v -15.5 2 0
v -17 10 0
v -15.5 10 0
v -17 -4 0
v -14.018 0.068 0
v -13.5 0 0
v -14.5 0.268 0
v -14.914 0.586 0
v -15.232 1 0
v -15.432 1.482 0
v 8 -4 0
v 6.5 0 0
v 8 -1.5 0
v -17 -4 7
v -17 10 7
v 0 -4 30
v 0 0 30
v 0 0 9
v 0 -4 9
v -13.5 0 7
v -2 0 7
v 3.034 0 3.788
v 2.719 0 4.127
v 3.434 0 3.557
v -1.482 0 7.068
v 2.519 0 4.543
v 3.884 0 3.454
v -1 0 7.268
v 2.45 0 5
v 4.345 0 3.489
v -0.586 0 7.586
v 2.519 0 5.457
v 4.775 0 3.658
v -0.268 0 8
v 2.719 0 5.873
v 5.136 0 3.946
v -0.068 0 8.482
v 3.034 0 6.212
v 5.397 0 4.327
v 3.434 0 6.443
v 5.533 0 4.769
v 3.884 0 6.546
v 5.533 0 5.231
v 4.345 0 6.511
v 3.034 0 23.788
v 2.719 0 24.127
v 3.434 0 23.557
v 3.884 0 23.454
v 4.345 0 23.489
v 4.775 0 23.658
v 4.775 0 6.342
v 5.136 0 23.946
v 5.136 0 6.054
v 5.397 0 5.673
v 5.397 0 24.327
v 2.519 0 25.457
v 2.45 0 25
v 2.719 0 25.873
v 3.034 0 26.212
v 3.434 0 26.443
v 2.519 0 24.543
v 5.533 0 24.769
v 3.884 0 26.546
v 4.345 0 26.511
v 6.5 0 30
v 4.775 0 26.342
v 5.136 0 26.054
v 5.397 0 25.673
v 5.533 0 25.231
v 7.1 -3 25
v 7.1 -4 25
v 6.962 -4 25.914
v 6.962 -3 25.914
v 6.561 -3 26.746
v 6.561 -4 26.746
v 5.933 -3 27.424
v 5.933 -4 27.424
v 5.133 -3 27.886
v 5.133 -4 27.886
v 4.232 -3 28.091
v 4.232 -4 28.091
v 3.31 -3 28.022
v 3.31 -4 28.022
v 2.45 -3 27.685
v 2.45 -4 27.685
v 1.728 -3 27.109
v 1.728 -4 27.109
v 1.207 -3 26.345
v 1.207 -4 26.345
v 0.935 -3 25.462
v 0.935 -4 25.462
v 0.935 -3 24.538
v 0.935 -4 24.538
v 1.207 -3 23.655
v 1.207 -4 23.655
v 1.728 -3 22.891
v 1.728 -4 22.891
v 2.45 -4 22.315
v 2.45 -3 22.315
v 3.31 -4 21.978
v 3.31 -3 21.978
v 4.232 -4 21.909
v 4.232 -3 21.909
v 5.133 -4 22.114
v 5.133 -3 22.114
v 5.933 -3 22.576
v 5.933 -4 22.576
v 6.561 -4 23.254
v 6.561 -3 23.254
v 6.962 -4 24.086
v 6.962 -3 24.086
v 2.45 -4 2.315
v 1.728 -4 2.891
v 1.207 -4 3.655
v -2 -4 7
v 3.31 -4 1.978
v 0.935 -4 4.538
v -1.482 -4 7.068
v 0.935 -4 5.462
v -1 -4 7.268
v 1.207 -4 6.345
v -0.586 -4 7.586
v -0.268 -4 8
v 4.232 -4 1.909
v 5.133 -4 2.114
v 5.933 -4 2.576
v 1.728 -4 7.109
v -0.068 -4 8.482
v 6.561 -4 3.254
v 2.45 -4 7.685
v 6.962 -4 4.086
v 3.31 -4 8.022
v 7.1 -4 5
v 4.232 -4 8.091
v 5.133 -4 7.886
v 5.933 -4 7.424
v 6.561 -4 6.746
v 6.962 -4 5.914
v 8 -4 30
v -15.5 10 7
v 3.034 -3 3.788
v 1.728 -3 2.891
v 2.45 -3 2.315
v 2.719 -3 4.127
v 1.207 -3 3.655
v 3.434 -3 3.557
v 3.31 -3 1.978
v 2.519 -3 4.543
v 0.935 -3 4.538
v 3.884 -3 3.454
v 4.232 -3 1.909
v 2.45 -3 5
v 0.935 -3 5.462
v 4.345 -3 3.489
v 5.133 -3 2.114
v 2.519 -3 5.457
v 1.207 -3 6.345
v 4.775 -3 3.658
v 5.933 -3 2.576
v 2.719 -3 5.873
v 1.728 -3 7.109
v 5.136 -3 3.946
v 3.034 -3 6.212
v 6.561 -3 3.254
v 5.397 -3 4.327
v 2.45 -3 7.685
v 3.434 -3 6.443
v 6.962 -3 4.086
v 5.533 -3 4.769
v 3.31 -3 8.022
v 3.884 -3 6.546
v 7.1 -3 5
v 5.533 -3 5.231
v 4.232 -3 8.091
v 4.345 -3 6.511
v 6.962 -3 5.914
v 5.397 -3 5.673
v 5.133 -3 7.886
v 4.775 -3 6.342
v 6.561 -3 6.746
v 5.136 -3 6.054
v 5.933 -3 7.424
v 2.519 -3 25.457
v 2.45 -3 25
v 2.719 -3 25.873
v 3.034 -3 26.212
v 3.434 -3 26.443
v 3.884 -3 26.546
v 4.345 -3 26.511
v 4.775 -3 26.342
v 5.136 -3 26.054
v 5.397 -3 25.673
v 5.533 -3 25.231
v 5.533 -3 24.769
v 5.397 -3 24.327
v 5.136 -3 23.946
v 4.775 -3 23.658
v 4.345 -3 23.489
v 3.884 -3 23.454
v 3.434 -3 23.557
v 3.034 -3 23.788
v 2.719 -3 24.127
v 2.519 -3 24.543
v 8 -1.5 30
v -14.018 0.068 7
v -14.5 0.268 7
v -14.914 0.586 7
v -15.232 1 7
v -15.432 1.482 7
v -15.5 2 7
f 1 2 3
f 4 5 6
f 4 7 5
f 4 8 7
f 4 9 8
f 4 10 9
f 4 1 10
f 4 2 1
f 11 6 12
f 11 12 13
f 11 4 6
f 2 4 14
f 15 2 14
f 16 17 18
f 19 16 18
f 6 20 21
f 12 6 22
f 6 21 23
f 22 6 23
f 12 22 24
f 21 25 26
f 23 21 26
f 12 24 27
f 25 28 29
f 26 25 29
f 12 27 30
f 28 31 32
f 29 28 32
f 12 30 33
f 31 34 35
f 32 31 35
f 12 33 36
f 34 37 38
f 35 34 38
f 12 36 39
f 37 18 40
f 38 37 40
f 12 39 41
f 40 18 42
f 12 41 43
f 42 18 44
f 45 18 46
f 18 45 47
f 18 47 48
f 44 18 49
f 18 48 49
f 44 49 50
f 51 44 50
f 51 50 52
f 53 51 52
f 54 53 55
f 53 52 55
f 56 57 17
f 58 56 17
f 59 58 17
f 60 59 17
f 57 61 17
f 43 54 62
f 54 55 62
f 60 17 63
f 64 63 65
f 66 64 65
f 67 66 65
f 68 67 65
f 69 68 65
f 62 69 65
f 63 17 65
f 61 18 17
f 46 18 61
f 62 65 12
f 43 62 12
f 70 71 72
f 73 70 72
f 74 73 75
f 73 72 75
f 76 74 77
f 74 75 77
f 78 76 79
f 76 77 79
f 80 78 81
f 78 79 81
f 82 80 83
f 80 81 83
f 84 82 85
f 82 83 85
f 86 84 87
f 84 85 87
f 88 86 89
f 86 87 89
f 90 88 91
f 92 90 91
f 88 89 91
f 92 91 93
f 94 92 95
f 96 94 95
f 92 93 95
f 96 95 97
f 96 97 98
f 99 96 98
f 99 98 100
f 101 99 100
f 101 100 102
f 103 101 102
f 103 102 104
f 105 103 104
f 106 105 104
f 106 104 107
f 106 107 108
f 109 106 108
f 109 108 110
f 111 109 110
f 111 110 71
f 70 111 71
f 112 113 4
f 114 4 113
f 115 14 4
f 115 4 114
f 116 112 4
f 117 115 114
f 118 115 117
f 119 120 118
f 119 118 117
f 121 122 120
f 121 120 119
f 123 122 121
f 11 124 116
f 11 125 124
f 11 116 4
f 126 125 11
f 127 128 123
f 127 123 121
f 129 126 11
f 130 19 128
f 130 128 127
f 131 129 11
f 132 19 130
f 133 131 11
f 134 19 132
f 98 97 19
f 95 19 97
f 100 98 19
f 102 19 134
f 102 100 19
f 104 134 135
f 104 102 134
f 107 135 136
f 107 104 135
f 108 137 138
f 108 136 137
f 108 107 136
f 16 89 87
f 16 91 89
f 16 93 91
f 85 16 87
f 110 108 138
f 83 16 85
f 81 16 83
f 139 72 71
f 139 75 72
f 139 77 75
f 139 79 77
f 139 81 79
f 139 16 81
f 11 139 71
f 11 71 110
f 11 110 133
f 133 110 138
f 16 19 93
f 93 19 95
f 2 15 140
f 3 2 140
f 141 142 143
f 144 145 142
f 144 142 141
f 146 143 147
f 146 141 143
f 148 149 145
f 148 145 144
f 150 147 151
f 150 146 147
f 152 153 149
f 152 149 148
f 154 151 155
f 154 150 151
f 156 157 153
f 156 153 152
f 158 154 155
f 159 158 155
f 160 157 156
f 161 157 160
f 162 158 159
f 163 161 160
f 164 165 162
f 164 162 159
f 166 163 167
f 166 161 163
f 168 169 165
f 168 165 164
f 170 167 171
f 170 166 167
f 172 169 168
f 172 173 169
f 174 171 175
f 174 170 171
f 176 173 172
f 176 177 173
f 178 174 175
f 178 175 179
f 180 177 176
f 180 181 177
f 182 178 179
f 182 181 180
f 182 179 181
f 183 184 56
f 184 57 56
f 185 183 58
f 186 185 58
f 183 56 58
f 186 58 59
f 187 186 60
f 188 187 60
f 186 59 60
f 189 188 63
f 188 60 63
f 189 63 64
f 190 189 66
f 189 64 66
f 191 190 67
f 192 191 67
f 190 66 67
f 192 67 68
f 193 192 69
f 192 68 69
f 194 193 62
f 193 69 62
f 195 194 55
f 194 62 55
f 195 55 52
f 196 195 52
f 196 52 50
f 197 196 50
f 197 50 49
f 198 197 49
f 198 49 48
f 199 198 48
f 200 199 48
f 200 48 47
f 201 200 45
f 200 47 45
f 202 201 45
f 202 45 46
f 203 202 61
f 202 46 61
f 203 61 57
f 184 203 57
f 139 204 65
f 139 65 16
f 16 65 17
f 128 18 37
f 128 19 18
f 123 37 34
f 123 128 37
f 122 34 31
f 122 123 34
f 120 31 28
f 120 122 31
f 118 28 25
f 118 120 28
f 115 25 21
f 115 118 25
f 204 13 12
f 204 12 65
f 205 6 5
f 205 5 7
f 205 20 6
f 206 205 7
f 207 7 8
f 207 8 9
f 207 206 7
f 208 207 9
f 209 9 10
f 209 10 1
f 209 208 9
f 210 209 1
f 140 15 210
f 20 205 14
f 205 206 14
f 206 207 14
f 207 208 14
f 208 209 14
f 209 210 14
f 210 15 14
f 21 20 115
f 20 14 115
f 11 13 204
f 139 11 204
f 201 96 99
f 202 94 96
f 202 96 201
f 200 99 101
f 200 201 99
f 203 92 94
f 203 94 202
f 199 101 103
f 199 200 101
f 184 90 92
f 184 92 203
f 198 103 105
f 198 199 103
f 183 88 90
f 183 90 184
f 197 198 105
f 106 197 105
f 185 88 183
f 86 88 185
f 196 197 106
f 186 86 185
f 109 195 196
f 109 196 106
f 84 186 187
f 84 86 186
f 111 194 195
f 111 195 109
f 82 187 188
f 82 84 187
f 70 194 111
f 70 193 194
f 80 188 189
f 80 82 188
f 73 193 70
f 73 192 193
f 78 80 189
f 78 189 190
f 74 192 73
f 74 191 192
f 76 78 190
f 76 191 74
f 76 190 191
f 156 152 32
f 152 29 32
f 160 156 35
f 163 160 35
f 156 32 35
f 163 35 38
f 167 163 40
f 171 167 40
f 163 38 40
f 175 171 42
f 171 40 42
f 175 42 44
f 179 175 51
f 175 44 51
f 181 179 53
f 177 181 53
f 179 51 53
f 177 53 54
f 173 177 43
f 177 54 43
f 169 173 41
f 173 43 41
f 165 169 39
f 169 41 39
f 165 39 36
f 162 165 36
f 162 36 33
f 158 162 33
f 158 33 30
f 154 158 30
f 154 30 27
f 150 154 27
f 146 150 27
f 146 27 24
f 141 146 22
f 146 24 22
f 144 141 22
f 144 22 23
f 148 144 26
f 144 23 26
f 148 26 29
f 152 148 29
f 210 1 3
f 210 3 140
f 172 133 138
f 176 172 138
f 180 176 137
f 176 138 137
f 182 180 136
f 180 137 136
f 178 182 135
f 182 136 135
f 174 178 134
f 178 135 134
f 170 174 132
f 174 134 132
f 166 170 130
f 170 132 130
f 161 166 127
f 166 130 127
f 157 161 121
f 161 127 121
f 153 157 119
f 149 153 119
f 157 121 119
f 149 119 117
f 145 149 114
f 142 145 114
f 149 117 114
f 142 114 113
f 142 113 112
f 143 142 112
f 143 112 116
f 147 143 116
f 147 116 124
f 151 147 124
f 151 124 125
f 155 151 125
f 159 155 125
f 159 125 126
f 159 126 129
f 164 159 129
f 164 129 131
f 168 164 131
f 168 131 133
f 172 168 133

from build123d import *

# Parameters (mm, degrees)
F1_DEPTH       = 4
F3_D           = 3.1
F3_CBORE_D     = 6.2
F3_CBORE_DEPTH = 1
F4_W           = 1.5
F4_H           = 7
F5_DEPTH       = 10
F6_SIZE        = 1.5
F7_R           = 2


with BuildPart() as f1:
    # F0 (on Front) → F1 (new body)
    with BuildSketch(Plane.XZ):
        Polygon((-17, 0), (8, 0), (8, 30), (0, 30), (0, 7), (-17, 7), align=None)
    extrude(amount=F1_DEPTH)

    # F3 (through all)
    with Locations(Plane.XZ.offset(4)):
        with Locations((4, 25), (4, 5)):
            CounterBoreHole(F3_D / 2, F3_CBORE_D / 2, F3_CBORE_DEPTH)

    # F4 (on Front) → F5 (join)
    with BuildSketch(Plane.XZ):
        with Locations((-16.25, 3.5)):
            Rectangle(F4_W, F4_H)
    extrude(amount=-F5_DEPTH)

    # F6
    f6_edges = [f1.edges().sort_by_distance(p)[0] for p in [
        (8, 0, 15),
    ]]
    chamfer(f6_edges, length=F6_SIZE)

    # F7
    f7_edges = [f1.edges().sort_by_distance(p)[0] for p in [
        (-15.5, 0, 3.5),
        (0, -2, 7),
    ]]
    fillet(f7_edges, radius=F7_R)


solid = f1.part
